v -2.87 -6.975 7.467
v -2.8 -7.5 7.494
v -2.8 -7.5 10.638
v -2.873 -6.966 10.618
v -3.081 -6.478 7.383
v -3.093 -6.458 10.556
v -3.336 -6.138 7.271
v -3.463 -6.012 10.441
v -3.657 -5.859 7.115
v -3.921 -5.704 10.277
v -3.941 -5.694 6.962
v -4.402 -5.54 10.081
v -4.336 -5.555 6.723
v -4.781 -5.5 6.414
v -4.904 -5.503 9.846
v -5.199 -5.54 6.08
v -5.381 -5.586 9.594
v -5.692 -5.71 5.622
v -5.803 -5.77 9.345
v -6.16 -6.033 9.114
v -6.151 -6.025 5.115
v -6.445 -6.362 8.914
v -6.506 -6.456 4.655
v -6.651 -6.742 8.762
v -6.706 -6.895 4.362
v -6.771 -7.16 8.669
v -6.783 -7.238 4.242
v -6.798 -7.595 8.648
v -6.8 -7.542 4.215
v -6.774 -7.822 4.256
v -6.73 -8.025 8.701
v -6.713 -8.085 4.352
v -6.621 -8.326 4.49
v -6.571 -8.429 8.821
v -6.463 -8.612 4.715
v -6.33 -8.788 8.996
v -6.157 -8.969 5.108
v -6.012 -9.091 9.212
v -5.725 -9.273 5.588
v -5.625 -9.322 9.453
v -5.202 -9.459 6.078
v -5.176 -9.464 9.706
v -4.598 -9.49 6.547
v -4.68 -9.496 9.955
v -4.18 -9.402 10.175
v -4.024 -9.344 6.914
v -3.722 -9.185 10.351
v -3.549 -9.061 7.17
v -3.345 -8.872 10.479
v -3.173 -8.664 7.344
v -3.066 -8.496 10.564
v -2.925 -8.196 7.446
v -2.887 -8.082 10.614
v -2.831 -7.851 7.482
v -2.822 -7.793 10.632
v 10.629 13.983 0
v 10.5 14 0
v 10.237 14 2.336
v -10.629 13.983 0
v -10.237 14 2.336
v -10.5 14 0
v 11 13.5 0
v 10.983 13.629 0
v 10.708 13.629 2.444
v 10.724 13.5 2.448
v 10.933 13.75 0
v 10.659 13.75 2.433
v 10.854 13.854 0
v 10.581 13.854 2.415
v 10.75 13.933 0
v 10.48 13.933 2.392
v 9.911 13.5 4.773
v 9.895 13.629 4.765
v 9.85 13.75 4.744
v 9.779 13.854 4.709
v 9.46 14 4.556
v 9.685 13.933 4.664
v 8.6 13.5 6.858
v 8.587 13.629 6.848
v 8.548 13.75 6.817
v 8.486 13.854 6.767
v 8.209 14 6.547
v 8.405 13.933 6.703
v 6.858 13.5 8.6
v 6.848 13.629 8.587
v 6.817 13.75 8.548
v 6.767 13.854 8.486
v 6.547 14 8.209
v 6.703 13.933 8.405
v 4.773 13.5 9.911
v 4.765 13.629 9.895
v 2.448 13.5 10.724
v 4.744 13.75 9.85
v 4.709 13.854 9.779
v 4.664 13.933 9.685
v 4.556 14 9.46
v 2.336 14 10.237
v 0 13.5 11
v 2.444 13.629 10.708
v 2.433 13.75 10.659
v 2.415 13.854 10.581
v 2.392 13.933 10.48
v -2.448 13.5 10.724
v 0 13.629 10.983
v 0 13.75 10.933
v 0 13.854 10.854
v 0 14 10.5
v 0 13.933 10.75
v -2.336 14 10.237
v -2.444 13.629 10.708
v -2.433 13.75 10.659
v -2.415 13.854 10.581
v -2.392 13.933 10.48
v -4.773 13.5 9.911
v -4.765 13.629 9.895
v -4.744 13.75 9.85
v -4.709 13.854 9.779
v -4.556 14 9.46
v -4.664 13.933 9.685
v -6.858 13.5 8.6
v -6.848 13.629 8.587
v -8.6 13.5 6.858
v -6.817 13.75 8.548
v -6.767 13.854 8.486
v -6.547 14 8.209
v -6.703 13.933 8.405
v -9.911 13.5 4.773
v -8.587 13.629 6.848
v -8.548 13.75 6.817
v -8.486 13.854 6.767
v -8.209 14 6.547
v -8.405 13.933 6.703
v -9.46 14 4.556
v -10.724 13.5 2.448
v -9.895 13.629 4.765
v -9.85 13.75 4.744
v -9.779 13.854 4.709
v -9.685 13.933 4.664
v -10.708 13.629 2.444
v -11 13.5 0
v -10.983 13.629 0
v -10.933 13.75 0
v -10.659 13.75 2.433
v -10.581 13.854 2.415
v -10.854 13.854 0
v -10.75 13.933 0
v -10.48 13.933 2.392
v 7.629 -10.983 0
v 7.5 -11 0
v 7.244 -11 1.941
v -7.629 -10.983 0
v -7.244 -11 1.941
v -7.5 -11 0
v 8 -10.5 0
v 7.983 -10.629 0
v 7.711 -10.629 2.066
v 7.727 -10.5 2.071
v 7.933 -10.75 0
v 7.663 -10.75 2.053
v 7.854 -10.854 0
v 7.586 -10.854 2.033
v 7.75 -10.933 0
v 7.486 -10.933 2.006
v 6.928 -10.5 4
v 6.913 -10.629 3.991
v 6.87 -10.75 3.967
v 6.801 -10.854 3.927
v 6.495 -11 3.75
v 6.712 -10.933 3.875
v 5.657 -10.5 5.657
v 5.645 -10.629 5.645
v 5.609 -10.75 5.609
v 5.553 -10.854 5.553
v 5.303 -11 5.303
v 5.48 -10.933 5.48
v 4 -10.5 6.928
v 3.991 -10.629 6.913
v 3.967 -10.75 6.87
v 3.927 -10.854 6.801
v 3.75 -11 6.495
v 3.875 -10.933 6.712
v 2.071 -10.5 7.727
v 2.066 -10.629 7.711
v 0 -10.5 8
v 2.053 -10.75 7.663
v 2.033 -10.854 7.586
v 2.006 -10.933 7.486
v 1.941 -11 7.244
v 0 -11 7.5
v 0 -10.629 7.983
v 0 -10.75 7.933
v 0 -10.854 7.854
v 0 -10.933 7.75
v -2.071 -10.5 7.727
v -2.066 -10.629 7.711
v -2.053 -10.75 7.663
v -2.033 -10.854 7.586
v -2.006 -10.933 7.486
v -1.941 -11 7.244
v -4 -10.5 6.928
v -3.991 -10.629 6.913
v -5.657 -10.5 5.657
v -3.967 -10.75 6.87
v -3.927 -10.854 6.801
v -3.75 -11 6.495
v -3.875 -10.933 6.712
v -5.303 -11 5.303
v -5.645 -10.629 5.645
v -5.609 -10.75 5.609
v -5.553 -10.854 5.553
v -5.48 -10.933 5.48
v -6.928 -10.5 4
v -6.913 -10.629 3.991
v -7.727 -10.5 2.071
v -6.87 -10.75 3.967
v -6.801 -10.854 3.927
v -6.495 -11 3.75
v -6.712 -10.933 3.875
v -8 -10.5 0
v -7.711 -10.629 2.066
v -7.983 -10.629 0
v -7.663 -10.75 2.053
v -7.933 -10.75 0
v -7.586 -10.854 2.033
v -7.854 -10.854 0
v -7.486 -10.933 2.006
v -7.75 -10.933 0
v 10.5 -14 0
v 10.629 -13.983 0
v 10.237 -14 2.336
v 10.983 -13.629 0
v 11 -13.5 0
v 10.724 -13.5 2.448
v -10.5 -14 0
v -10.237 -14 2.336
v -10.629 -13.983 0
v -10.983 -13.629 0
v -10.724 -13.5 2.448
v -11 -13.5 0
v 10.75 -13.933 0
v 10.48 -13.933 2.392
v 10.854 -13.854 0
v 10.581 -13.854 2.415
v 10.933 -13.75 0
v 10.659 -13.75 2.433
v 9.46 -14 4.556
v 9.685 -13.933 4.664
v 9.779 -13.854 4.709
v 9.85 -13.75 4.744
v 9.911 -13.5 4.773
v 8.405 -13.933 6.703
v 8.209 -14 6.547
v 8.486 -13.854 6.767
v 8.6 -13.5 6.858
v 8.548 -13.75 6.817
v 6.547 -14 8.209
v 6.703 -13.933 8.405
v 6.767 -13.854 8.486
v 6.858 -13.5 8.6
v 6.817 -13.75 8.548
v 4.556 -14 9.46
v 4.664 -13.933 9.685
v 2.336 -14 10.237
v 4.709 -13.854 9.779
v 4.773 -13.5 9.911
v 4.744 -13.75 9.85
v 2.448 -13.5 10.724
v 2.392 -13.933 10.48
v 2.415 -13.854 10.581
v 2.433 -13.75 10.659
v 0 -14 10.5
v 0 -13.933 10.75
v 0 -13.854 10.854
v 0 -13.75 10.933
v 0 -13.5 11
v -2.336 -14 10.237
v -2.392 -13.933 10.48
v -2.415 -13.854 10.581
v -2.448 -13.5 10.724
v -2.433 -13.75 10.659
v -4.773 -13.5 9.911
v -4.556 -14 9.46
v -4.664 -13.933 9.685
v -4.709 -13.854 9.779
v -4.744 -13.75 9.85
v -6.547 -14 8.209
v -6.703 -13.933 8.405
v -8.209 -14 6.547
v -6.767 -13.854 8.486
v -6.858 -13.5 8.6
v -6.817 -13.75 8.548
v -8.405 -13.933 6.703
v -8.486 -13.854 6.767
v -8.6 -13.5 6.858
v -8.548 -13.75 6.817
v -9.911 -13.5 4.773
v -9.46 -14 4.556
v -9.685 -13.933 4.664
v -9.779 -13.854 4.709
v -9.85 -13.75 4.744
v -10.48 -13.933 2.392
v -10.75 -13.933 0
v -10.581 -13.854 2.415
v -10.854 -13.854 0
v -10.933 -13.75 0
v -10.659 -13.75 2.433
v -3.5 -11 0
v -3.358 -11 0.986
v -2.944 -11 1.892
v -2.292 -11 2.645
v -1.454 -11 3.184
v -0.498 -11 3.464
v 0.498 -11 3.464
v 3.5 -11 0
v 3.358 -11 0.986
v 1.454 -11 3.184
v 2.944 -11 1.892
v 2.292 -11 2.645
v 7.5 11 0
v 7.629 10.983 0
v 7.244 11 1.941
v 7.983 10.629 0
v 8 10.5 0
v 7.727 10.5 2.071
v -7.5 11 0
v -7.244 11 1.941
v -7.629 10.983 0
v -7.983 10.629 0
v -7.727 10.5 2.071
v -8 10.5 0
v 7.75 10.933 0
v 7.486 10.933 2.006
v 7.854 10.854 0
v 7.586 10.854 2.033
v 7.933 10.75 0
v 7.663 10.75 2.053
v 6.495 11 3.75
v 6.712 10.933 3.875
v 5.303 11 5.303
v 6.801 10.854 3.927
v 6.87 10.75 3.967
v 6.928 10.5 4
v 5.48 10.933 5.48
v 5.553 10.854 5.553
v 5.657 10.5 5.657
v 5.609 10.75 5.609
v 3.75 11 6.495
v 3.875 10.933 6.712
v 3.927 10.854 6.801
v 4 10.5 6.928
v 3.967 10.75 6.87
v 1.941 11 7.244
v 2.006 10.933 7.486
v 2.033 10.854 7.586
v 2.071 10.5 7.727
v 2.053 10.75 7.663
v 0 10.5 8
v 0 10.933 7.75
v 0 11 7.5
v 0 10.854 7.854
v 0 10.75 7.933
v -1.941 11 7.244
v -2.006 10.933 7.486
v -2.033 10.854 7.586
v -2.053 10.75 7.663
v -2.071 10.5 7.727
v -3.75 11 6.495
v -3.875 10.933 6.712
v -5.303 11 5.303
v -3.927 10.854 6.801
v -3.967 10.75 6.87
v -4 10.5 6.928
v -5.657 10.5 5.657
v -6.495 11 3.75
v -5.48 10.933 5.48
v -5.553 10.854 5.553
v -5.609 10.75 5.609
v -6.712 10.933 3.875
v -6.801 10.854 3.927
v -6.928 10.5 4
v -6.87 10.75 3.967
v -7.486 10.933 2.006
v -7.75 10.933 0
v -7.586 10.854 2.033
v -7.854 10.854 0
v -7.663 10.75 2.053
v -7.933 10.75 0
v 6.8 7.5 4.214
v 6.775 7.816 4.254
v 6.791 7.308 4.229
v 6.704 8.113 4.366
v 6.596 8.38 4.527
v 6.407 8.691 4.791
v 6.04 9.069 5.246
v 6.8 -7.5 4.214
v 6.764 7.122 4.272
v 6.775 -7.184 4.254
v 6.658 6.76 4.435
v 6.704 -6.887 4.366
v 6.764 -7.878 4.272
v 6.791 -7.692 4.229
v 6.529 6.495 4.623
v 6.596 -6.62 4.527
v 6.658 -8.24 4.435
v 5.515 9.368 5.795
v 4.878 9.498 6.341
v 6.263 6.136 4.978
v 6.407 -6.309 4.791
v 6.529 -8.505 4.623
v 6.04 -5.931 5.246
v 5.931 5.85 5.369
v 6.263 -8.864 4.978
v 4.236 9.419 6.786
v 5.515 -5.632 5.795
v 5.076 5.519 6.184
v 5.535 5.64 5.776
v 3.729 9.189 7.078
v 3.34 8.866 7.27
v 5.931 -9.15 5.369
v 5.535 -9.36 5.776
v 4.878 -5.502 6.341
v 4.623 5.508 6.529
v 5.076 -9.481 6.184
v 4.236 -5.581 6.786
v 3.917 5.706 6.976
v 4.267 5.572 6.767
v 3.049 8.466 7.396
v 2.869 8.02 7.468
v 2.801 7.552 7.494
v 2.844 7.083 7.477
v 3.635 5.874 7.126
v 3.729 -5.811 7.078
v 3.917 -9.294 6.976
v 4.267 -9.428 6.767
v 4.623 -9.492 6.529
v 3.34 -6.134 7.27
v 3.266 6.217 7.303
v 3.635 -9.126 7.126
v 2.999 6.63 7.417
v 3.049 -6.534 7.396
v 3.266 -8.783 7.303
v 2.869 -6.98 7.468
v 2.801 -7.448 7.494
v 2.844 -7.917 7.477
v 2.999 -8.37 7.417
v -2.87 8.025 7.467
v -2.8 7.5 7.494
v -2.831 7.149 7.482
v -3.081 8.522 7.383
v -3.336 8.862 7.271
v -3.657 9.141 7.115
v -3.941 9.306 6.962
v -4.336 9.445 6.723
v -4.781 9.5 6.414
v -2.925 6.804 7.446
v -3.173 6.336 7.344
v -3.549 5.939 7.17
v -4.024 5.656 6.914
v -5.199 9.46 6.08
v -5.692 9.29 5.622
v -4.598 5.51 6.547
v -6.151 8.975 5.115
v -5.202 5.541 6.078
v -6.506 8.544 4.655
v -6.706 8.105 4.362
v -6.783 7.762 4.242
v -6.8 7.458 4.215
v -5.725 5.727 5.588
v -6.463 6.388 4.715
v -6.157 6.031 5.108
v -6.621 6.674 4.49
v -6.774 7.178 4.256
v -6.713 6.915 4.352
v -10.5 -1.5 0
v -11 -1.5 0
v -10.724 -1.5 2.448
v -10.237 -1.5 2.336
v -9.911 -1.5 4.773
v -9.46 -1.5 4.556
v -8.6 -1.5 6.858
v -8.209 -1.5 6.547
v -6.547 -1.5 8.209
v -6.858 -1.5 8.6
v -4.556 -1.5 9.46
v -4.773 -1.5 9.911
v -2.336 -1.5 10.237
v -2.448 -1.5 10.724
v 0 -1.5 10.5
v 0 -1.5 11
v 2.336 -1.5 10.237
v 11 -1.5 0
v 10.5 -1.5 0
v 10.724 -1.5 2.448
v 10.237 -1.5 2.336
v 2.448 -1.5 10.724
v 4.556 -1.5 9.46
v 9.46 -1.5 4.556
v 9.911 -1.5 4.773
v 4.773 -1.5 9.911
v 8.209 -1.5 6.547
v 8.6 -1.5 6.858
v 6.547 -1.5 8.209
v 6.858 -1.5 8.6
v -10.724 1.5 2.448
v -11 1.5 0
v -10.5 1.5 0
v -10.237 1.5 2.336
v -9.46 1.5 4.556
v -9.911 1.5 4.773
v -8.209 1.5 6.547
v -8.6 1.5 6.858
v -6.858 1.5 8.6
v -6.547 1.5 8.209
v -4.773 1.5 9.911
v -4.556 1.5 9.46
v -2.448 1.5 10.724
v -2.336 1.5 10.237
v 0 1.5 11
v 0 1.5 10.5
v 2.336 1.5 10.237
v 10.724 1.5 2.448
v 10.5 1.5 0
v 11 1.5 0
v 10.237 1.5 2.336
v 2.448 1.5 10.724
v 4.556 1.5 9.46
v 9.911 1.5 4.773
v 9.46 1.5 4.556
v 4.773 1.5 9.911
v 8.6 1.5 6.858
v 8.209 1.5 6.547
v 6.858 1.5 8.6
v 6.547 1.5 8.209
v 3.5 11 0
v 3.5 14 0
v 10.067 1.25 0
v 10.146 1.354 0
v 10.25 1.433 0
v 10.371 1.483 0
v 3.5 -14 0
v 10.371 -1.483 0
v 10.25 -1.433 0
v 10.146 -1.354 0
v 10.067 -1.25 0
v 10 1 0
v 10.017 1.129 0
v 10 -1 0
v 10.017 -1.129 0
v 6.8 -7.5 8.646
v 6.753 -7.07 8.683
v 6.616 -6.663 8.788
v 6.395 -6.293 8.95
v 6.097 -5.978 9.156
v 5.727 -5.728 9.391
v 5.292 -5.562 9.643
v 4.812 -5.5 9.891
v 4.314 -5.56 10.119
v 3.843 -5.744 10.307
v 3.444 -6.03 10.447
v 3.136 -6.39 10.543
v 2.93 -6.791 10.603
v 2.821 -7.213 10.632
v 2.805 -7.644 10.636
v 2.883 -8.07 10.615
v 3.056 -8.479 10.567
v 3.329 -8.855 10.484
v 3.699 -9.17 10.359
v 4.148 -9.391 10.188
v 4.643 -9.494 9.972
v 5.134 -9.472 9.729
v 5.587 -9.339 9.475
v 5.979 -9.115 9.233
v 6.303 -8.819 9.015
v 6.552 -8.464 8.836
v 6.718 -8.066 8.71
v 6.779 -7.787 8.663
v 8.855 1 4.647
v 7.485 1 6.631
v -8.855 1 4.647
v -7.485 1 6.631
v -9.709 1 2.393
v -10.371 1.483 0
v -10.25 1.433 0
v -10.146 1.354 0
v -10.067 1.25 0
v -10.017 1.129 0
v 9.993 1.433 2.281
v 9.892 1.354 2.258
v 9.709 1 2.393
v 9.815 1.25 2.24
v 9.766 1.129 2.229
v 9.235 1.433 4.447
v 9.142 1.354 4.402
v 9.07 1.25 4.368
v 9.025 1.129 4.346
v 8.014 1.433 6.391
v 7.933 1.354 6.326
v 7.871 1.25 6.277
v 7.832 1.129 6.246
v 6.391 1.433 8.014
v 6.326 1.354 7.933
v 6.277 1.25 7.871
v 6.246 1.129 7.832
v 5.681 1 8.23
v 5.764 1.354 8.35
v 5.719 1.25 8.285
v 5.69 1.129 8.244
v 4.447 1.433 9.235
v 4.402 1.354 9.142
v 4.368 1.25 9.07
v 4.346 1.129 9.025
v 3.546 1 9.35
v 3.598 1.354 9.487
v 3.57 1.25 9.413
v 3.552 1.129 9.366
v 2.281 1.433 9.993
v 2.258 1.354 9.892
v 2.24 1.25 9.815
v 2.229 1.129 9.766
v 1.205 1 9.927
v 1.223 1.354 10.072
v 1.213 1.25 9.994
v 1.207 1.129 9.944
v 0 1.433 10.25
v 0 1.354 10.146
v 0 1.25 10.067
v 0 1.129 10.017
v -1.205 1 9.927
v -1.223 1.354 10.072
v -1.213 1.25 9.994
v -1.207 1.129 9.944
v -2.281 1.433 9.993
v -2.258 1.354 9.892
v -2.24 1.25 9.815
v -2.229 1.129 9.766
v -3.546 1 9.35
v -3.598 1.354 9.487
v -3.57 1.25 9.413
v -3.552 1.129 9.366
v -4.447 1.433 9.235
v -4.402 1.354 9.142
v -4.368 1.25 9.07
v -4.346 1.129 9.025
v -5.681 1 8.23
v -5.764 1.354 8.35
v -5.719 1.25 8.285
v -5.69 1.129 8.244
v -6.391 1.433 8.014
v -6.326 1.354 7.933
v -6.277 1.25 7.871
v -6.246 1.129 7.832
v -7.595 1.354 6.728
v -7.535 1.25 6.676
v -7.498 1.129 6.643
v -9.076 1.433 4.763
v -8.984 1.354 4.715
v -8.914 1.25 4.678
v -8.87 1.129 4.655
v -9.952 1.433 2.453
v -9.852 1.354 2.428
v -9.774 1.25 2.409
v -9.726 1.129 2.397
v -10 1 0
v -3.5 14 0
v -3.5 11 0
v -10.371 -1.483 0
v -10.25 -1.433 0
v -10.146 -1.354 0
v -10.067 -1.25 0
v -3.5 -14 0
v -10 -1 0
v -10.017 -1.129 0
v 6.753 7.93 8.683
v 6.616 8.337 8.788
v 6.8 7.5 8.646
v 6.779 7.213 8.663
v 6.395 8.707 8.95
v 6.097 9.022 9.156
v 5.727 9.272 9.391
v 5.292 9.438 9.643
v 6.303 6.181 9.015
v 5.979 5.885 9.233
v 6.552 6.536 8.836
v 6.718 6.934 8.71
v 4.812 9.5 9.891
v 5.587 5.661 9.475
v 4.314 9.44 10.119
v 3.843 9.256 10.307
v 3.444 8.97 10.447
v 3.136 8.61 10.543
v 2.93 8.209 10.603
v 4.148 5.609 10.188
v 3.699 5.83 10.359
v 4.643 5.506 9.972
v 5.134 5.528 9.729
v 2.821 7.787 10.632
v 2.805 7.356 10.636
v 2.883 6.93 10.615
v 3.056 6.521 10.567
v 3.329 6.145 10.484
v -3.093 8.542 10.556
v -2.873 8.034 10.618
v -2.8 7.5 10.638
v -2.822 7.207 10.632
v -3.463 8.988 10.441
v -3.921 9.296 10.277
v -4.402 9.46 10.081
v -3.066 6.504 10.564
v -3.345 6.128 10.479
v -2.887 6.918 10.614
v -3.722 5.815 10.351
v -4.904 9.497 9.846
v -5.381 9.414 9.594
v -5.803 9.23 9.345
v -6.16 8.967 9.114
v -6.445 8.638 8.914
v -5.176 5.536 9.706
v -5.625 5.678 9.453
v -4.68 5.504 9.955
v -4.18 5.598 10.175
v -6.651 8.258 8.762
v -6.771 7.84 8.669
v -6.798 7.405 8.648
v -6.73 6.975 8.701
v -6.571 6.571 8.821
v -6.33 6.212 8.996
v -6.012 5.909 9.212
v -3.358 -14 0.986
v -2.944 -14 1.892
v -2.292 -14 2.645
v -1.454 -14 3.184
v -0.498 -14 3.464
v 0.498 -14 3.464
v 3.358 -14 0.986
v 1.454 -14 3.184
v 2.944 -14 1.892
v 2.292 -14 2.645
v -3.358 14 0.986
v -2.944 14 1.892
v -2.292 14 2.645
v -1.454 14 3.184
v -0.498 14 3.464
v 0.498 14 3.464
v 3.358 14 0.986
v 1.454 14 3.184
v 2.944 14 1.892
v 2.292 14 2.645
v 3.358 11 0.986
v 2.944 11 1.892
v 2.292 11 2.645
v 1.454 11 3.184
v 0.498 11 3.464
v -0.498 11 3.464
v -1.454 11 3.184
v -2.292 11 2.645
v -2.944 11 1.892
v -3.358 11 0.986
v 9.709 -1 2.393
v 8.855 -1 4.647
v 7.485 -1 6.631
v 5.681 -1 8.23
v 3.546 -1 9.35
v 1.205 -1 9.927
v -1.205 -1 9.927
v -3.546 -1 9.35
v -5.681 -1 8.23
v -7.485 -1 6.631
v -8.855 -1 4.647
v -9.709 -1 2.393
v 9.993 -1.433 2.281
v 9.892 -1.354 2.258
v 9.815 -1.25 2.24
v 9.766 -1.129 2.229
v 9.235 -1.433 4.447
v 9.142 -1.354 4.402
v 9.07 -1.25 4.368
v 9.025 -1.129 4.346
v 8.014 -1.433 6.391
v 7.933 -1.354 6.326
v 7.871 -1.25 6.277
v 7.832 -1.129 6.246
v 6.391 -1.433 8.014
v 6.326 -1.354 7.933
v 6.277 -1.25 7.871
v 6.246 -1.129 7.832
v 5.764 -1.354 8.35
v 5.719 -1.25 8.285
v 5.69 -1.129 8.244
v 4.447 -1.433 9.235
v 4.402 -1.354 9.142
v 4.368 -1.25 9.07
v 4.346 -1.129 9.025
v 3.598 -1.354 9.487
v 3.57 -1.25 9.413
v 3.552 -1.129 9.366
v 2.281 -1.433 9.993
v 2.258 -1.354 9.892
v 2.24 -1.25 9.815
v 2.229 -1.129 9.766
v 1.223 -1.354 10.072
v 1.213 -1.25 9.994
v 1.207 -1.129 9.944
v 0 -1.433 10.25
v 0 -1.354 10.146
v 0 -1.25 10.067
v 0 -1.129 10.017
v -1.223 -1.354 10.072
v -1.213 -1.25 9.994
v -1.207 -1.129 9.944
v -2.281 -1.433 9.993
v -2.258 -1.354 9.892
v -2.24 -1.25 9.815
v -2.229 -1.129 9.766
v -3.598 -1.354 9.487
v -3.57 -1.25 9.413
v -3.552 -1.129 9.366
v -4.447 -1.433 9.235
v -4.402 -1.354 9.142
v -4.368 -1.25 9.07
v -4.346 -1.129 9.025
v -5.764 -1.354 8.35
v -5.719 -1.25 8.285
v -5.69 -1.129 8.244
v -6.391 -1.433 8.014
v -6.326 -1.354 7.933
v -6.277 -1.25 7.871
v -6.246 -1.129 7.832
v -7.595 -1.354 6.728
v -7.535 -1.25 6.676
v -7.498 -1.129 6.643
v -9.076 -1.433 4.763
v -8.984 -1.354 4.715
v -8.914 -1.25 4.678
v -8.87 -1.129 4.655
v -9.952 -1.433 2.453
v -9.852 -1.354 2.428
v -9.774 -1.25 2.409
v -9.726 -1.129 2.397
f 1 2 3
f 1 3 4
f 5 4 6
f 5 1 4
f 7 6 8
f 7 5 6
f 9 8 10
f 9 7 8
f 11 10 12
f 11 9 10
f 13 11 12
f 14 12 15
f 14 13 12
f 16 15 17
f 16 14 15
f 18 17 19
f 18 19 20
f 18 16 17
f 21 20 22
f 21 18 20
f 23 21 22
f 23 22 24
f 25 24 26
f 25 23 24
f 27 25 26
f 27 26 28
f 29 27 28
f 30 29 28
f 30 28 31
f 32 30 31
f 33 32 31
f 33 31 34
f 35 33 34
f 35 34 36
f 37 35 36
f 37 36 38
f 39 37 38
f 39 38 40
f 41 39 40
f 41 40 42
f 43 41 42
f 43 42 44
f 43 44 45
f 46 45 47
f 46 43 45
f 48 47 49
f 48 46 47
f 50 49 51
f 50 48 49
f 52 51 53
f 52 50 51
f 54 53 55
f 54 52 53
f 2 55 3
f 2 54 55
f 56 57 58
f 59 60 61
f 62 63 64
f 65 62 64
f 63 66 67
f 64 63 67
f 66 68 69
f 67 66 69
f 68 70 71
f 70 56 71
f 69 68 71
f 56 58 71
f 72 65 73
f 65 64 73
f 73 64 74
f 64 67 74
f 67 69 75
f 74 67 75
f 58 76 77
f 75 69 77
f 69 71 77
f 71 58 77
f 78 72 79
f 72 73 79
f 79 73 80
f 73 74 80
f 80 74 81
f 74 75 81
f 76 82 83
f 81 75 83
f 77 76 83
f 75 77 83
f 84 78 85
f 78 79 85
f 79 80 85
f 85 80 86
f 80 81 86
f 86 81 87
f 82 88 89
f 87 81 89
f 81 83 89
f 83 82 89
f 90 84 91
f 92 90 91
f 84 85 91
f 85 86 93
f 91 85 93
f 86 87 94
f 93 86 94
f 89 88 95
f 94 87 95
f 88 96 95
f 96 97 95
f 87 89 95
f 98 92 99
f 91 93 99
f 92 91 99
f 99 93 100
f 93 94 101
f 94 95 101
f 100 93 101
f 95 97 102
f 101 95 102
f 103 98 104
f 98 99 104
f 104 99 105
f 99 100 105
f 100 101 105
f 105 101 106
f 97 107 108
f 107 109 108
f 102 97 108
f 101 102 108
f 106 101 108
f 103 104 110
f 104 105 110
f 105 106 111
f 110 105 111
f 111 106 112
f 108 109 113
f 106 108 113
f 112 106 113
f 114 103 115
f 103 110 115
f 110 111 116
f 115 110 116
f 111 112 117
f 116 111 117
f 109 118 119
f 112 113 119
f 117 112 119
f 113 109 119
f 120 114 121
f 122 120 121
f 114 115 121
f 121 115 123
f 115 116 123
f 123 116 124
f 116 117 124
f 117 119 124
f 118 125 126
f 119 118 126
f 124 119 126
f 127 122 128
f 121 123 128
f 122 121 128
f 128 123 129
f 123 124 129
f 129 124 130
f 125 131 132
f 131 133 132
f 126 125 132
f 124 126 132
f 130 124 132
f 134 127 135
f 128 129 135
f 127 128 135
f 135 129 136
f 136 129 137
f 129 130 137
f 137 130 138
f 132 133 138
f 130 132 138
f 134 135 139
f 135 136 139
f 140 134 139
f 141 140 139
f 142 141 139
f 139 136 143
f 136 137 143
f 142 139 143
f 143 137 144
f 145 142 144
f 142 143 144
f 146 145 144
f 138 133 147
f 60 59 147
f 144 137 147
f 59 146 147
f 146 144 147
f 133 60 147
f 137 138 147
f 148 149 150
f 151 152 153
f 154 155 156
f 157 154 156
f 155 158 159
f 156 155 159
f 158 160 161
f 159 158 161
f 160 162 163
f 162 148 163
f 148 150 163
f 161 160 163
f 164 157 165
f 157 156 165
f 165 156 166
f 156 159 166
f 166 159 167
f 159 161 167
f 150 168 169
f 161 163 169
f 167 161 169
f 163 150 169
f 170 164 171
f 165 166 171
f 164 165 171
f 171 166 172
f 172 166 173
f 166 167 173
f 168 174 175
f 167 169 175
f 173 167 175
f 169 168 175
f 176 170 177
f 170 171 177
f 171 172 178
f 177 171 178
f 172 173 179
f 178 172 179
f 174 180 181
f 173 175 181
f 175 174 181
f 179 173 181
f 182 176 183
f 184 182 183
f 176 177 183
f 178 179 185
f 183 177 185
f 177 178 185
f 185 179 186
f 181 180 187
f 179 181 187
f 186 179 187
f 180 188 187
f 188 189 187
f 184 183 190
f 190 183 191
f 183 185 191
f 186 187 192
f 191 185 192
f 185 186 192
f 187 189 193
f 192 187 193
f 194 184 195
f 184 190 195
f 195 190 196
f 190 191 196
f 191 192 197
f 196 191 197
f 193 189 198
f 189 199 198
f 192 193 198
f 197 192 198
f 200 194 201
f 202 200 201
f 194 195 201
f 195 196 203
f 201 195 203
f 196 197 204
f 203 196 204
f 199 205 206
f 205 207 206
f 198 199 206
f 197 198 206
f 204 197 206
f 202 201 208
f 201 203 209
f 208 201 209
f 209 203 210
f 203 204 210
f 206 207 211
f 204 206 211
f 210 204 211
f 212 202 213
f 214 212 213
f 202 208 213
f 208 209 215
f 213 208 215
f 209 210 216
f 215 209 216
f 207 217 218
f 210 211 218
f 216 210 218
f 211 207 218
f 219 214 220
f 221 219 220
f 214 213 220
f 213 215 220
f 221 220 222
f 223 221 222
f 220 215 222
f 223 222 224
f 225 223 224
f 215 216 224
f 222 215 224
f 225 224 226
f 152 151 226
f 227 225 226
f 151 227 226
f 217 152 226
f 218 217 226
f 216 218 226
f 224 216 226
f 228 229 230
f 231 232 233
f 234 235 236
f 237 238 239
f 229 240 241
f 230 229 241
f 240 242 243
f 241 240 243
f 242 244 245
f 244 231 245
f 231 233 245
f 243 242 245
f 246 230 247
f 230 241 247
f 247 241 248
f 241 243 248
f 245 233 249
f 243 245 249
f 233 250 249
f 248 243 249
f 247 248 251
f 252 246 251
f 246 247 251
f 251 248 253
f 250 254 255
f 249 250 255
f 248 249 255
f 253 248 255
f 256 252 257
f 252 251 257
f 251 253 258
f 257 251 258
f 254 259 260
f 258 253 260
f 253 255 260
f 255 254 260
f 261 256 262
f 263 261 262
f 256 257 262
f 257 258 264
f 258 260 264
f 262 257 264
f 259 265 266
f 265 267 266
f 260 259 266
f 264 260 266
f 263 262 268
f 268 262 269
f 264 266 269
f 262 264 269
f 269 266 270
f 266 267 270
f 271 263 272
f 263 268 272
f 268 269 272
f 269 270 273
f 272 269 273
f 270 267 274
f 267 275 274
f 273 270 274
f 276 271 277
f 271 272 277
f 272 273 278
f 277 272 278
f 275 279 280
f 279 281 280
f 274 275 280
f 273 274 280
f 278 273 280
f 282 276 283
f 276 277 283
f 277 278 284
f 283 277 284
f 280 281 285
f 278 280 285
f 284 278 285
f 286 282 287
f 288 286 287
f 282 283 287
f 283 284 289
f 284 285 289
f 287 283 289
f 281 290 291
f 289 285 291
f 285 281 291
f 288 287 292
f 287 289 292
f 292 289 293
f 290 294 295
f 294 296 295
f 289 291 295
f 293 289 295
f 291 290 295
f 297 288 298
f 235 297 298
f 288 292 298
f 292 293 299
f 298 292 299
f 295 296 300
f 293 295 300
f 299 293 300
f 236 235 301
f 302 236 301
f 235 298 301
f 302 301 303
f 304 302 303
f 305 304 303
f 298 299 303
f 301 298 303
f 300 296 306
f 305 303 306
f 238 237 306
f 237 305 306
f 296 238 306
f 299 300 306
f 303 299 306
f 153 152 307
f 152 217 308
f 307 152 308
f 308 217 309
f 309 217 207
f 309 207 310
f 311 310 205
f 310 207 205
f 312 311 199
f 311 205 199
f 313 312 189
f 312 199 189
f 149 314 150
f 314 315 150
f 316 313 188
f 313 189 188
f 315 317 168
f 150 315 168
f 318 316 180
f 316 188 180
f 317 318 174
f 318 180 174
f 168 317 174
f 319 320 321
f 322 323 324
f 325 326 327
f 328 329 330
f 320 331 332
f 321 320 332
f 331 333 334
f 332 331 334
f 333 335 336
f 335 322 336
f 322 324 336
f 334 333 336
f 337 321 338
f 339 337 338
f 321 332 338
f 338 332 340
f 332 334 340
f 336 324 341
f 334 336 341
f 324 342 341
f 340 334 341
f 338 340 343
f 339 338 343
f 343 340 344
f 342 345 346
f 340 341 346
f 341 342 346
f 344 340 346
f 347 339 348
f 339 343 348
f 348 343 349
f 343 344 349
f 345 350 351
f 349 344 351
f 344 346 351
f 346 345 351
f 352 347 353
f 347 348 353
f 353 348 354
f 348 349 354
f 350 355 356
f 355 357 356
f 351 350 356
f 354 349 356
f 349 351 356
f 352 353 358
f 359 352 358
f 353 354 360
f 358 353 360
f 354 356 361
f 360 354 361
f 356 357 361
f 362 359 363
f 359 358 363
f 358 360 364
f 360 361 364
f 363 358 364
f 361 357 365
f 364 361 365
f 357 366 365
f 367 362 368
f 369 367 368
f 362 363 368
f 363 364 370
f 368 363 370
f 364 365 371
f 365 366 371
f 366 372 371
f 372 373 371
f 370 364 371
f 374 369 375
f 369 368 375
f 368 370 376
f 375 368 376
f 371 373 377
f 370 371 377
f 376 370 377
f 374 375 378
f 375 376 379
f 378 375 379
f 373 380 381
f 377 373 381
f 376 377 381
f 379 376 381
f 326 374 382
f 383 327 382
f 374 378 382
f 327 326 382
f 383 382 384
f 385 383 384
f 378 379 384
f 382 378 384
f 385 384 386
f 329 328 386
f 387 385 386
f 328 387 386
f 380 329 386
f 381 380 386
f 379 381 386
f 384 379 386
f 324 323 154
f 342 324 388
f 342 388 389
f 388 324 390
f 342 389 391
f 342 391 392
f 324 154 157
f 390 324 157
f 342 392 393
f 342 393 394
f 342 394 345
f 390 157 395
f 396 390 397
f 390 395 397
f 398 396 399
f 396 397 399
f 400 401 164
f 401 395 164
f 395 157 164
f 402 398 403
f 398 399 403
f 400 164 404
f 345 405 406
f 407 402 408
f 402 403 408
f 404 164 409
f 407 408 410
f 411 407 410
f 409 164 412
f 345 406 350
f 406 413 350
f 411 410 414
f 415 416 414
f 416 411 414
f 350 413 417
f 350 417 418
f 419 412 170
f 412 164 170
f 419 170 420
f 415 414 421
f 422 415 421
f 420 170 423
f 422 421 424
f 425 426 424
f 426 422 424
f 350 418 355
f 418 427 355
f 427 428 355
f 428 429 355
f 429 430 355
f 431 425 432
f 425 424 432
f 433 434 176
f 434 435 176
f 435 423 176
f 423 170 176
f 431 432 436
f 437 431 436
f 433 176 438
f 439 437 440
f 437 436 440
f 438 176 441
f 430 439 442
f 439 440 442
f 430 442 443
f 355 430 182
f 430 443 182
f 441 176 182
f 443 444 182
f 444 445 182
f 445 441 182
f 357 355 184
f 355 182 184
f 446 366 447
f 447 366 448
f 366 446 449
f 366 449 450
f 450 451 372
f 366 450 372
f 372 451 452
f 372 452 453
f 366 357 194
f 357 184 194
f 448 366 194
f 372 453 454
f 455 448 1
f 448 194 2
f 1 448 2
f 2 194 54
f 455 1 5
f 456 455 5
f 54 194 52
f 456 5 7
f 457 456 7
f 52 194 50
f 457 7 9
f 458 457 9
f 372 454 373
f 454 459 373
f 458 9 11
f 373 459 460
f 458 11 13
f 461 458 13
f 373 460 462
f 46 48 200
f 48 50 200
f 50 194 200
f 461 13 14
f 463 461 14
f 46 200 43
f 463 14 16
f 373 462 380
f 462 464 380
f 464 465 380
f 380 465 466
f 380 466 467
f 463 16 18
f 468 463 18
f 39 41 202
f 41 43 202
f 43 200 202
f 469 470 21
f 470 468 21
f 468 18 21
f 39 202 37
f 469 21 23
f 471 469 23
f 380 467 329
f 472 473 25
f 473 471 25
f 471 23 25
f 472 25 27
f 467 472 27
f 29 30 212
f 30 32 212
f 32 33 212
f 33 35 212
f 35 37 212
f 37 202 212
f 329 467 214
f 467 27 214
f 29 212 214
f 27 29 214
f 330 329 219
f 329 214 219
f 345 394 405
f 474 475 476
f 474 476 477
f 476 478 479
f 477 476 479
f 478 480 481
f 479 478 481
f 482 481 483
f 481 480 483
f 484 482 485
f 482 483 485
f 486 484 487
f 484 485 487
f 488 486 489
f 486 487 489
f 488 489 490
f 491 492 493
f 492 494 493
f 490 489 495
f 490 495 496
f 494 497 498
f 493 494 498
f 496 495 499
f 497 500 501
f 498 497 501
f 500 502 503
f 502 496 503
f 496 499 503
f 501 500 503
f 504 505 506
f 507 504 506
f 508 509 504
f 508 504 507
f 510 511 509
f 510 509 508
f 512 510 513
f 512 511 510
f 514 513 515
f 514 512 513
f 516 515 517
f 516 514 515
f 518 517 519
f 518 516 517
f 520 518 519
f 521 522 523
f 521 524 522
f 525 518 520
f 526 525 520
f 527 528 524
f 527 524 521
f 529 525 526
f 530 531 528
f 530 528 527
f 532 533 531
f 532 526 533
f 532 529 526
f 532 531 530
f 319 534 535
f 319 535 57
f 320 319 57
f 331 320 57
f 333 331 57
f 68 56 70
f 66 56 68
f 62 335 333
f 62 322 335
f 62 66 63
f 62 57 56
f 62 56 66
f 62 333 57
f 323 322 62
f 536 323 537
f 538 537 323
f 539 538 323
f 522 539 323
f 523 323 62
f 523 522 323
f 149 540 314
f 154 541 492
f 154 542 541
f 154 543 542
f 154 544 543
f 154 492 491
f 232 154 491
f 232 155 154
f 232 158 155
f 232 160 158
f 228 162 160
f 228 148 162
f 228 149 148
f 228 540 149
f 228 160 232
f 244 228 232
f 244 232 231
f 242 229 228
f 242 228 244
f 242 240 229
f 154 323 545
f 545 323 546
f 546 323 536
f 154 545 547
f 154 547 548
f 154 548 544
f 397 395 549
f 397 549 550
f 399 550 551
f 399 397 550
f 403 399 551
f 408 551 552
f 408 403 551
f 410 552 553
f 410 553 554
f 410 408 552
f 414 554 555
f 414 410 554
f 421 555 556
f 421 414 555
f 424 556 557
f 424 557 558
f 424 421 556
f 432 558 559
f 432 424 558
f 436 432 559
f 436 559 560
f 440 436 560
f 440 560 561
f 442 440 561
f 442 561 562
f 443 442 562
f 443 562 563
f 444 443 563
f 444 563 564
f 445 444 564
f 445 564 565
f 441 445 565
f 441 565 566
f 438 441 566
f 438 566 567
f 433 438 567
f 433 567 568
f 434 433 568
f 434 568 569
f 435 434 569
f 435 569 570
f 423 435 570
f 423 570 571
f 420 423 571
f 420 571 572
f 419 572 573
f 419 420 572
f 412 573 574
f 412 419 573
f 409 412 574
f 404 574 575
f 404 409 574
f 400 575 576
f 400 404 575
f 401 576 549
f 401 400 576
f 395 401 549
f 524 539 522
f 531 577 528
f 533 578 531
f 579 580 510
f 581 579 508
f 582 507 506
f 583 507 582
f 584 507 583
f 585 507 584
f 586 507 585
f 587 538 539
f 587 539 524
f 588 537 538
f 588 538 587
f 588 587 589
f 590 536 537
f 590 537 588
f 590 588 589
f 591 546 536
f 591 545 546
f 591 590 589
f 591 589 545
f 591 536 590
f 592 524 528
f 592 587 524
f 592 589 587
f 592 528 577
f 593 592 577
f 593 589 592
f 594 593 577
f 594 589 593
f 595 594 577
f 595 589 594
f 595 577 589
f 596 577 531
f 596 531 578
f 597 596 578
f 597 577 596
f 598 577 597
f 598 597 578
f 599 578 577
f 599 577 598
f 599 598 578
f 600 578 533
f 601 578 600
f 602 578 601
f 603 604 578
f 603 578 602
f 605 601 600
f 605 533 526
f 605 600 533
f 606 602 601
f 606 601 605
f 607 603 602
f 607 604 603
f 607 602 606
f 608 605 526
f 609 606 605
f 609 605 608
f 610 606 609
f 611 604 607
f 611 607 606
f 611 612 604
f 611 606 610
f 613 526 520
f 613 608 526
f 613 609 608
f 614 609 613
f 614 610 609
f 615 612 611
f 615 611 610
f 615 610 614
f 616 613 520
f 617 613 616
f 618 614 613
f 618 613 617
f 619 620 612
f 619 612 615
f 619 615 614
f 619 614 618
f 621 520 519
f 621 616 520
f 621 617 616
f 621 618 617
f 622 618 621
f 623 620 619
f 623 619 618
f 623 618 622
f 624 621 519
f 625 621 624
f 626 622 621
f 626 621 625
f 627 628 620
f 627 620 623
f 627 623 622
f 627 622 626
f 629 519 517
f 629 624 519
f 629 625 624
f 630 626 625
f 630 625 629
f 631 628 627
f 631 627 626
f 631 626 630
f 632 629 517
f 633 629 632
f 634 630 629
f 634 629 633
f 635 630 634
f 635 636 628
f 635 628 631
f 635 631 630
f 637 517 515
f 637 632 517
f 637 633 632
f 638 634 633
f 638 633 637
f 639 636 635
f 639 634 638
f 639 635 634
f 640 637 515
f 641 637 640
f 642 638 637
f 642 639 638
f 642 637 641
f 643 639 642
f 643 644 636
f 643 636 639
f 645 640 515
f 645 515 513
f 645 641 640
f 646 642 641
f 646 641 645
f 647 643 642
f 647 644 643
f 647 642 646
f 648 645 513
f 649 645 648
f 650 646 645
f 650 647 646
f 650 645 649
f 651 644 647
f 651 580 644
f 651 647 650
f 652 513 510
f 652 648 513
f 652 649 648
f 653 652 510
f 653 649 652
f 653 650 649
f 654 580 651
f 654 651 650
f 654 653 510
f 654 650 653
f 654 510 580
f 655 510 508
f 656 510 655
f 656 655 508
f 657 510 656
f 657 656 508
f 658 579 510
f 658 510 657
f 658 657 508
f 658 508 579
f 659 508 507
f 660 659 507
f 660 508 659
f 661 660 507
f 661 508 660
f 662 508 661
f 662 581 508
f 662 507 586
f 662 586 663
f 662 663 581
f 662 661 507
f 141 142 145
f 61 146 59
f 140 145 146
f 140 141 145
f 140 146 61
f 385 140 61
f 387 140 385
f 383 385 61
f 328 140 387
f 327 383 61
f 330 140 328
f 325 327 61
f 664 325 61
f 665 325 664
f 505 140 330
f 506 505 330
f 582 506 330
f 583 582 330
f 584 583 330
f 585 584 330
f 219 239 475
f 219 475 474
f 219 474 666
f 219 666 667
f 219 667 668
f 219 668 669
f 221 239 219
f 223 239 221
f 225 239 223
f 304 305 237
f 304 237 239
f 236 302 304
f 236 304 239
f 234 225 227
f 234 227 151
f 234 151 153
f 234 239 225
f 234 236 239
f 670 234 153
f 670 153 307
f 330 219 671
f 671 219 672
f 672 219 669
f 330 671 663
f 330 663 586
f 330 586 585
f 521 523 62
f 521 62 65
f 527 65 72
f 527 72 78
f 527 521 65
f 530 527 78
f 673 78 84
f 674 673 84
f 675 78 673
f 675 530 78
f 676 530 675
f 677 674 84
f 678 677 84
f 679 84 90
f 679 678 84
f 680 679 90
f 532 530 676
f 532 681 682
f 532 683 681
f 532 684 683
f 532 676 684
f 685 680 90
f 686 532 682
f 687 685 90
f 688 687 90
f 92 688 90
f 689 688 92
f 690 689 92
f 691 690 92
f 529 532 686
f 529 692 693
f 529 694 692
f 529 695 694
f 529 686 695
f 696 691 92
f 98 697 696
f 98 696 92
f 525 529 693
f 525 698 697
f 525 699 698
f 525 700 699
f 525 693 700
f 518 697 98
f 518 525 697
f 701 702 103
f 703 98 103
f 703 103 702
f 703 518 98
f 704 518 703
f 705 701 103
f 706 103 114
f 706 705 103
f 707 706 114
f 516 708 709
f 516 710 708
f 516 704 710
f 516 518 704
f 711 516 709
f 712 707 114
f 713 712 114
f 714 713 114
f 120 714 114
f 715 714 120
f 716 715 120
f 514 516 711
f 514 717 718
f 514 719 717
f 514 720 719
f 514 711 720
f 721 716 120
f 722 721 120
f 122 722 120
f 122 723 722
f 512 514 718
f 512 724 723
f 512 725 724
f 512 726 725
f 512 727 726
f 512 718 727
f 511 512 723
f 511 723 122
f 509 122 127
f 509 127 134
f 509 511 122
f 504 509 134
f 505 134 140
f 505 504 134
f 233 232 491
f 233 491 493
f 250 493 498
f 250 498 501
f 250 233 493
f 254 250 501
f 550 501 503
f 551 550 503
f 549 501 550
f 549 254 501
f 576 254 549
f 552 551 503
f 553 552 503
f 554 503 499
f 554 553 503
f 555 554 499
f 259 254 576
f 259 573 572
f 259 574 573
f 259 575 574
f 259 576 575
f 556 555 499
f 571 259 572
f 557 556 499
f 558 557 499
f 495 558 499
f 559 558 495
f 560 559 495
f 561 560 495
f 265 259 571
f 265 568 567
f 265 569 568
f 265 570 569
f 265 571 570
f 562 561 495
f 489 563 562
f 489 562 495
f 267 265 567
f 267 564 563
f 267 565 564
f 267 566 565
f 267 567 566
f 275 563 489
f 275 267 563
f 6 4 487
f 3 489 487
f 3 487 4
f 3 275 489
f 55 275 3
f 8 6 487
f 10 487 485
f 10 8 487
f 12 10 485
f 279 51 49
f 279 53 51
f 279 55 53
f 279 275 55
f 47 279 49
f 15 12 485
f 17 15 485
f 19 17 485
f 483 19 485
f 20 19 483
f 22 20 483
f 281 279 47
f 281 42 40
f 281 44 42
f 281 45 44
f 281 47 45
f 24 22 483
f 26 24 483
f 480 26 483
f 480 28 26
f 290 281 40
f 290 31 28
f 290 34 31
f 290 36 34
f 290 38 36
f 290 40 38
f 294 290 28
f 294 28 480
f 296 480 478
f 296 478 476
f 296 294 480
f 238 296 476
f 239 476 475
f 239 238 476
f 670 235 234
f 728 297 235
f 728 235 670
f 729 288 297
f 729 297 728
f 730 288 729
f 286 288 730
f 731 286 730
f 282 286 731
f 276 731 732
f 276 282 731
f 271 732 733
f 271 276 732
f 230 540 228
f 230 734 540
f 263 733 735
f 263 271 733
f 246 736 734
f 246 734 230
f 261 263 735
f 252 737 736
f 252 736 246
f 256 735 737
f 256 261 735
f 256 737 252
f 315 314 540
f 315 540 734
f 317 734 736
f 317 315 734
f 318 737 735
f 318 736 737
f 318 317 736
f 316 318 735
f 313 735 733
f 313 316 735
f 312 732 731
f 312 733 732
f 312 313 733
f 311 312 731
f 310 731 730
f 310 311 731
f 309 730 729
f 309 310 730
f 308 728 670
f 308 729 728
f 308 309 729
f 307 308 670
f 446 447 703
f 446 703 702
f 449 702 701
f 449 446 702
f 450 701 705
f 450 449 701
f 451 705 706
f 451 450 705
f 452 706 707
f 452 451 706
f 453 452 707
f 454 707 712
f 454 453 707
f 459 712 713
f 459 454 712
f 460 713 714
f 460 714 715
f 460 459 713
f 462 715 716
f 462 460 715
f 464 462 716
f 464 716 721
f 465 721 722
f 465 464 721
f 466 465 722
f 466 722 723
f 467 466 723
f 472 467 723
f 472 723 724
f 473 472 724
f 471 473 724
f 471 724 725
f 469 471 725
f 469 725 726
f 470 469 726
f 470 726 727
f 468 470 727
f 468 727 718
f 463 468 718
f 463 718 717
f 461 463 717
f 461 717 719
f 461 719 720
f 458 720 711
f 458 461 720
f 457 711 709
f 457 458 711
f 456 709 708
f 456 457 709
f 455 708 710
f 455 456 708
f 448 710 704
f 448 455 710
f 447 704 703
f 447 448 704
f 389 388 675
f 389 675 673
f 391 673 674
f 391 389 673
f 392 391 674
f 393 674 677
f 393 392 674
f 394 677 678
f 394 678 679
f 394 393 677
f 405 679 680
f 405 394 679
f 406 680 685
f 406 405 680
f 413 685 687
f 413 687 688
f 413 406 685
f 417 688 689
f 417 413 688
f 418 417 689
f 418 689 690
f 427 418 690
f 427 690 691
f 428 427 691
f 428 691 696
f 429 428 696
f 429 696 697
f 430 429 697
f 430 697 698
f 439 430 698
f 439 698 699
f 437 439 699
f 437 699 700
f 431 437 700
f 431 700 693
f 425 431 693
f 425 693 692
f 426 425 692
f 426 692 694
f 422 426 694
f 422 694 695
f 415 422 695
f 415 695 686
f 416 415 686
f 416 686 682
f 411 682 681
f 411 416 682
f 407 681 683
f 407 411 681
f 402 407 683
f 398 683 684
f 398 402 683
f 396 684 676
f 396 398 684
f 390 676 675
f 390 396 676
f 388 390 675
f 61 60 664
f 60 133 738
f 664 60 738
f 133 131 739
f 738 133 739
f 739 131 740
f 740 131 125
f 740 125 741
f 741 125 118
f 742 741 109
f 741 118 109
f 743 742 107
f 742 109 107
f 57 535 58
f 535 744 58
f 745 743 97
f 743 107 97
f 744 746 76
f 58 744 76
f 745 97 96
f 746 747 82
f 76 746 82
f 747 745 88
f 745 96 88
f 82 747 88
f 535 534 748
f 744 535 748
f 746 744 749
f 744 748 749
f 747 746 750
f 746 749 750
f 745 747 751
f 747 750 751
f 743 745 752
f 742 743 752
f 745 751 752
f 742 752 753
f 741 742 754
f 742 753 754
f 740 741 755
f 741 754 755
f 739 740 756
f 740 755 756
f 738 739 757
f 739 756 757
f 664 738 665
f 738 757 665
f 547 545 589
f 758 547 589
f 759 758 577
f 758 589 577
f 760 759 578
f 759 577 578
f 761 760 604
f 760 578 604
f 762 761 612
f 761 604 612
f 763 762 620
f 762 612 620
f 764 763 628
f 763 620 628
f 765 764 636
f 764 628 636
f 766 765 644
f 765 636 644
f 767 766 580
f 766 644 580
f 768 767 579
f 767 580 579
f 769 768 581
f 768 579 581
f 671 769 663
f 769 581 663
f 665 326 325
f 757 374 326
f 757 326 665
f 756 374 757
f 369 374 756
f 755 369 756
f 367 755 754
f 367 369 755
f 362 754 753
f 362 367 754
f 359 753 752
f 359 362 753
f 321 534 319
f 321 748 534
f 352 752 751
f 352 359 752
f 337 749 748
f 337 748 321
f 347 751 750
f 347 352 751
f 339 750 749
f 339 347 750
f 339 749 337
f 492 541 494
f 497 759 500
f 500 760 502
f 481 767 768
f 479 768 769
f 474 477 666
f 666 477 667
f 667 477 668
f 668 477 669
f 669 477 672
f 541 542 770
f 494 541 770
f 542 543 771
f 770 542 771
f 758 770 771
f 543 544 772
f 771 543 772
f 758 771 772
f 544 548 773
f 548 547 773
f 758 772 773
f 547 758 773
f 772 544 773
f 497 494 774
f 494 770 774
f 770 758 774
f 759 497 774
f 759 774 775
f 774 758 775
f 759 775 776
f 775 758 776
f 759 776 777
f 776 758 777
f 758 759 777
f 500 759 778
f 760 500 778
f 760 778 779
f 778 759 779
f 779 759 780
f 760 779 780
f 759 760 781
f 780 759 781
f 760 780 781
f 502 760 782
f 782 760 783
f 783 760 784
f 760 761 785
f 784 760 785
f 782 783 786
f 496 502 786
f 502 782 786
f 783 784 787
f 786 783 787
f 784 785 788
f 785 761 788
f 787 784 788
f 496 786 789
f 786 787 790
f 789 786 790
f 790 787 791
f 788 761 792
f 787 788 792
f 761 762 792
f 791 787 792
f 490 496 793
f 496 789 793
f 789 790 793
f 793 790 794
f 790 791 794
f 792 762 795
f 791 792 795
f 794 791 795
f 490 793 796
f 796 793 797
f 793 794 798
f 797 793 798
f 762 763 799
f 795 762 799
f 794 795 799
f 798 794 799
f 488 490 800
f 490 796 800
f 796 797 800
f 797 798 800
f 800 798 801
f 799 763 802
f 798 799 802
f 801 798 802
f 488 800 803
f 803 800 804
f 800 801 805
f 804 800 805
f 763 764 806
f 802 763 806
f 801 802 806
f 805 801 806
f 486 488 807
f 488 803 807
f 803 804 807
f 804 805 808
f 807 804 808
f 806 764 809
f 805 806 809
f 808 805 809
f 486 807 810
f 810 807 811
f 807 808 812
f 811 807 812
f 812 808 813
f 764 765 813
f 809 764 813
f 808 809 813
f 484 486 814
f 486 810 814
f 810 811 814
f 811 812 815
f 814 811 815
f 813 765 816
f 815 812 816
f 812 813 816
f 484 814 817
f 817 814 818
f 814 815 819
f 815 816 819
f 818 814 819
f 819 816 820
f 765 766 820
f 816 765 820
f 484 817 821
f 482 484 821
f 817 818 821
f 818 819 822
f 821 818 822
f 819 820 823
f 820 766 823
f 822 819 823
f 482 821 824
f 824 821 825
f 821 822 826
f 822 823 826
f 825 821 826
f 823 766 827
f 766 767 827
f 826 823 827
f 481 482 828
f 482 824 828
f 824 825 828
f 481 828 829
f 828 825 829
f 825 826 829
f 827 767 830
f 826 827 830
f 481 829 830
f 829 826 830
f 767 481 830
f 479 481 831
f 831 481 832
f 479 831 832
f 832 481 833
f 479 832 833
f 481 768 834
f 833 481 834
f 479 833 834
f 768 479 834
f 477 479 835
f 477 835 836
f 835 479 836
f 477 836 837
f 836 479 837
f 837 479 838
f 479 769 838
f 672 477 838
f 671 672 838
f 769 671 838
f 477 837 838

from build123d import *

# Parameters (mm, degrees)
F1_DEPTH      = 14
F2_R          = 8
F3_DEPTH      = 11
F4_R          = 3.5
F5_DEPTH      = 14.001
F5_DEPTH_BACK = 14.001
F6_R          = 2
F7_DEPTH      = 11.001
F8_R          = 11
F8_R_2        = 10
F9_DEPTH      = 1.5
F10_R         = 0.5


with BuildPart() as f1:
    # F0 (on Front) → F1 (new body, symmetric)
    with BuildSketch(Plane.XZ):
        with BuildLine():
            Line((8, 0), (11, 0))
            ThreePointArc((11, 0), (0, 11), (-11, 0))
            Line((-11, 0), (-8, 0))
            Line((-8, 0), (8, 0))
        make_face()
    extrude(amount=F1_DEPTH, both=True)

    # F2 (on Front) → F3 (cut, symmetric)
    with BuildSketch(Plane.XZ):
        Circle(F2_R)
    extrude(amount=F3_DEPTH, both=True, mode=Mode.SUBTRACT)

    # F4 (on Front) → F5 (cut, two sides)
    with BuildSketch(Plane.XZ) as f5_sk:
        Circle(F4_R)
    extrude(amount=-F5_DEPTH, mode=Mode.SUBTRACT)
    extrude(f5_sk.sketch, amount=F5_DEPTH_BACK, mode=Mode.SUBTRACT)

    # F6 (on Top) → F7 (cut, through all)
    with BuildSketch(Plane.XY):
        with Locations((4.8, 7.5)):
            Circle(F6_R)
        with Locations((-4.8, 7.5)):
            Circle(F6_R)
        with Locations((4.8, -7.5)):
            Circle(F6_R)
        with Locations((-4.8, -7.5)):
            Circle(F6_R)
    extrude(amount=F7_DEPTH, mode=Mode.SUBTRACT)

    # F8 (on Front) → F9 (cut, symmetric)
    with BuildSketch(Plane.XZ):
        Circle(F8_R)
        Circle(F8_R_2, mode=Mode.SUBTRACT)
    extrude(amount=F9_DEPTH, both=True, mode=Mode.SUBTRACT)

    # F10
    f10_edges = [f1.edges().sort_by_distance(p)[0] for p in [
        (0, 1.5, 10),
        (0, -1.5, 10),
        (0, 14, 11),
        (0, -14, 11),
        (0, 11, 8),
        (0, -11, 8),
    ]]
    fillet(f10_edges, radius=F10_R)


solid = f1.part
